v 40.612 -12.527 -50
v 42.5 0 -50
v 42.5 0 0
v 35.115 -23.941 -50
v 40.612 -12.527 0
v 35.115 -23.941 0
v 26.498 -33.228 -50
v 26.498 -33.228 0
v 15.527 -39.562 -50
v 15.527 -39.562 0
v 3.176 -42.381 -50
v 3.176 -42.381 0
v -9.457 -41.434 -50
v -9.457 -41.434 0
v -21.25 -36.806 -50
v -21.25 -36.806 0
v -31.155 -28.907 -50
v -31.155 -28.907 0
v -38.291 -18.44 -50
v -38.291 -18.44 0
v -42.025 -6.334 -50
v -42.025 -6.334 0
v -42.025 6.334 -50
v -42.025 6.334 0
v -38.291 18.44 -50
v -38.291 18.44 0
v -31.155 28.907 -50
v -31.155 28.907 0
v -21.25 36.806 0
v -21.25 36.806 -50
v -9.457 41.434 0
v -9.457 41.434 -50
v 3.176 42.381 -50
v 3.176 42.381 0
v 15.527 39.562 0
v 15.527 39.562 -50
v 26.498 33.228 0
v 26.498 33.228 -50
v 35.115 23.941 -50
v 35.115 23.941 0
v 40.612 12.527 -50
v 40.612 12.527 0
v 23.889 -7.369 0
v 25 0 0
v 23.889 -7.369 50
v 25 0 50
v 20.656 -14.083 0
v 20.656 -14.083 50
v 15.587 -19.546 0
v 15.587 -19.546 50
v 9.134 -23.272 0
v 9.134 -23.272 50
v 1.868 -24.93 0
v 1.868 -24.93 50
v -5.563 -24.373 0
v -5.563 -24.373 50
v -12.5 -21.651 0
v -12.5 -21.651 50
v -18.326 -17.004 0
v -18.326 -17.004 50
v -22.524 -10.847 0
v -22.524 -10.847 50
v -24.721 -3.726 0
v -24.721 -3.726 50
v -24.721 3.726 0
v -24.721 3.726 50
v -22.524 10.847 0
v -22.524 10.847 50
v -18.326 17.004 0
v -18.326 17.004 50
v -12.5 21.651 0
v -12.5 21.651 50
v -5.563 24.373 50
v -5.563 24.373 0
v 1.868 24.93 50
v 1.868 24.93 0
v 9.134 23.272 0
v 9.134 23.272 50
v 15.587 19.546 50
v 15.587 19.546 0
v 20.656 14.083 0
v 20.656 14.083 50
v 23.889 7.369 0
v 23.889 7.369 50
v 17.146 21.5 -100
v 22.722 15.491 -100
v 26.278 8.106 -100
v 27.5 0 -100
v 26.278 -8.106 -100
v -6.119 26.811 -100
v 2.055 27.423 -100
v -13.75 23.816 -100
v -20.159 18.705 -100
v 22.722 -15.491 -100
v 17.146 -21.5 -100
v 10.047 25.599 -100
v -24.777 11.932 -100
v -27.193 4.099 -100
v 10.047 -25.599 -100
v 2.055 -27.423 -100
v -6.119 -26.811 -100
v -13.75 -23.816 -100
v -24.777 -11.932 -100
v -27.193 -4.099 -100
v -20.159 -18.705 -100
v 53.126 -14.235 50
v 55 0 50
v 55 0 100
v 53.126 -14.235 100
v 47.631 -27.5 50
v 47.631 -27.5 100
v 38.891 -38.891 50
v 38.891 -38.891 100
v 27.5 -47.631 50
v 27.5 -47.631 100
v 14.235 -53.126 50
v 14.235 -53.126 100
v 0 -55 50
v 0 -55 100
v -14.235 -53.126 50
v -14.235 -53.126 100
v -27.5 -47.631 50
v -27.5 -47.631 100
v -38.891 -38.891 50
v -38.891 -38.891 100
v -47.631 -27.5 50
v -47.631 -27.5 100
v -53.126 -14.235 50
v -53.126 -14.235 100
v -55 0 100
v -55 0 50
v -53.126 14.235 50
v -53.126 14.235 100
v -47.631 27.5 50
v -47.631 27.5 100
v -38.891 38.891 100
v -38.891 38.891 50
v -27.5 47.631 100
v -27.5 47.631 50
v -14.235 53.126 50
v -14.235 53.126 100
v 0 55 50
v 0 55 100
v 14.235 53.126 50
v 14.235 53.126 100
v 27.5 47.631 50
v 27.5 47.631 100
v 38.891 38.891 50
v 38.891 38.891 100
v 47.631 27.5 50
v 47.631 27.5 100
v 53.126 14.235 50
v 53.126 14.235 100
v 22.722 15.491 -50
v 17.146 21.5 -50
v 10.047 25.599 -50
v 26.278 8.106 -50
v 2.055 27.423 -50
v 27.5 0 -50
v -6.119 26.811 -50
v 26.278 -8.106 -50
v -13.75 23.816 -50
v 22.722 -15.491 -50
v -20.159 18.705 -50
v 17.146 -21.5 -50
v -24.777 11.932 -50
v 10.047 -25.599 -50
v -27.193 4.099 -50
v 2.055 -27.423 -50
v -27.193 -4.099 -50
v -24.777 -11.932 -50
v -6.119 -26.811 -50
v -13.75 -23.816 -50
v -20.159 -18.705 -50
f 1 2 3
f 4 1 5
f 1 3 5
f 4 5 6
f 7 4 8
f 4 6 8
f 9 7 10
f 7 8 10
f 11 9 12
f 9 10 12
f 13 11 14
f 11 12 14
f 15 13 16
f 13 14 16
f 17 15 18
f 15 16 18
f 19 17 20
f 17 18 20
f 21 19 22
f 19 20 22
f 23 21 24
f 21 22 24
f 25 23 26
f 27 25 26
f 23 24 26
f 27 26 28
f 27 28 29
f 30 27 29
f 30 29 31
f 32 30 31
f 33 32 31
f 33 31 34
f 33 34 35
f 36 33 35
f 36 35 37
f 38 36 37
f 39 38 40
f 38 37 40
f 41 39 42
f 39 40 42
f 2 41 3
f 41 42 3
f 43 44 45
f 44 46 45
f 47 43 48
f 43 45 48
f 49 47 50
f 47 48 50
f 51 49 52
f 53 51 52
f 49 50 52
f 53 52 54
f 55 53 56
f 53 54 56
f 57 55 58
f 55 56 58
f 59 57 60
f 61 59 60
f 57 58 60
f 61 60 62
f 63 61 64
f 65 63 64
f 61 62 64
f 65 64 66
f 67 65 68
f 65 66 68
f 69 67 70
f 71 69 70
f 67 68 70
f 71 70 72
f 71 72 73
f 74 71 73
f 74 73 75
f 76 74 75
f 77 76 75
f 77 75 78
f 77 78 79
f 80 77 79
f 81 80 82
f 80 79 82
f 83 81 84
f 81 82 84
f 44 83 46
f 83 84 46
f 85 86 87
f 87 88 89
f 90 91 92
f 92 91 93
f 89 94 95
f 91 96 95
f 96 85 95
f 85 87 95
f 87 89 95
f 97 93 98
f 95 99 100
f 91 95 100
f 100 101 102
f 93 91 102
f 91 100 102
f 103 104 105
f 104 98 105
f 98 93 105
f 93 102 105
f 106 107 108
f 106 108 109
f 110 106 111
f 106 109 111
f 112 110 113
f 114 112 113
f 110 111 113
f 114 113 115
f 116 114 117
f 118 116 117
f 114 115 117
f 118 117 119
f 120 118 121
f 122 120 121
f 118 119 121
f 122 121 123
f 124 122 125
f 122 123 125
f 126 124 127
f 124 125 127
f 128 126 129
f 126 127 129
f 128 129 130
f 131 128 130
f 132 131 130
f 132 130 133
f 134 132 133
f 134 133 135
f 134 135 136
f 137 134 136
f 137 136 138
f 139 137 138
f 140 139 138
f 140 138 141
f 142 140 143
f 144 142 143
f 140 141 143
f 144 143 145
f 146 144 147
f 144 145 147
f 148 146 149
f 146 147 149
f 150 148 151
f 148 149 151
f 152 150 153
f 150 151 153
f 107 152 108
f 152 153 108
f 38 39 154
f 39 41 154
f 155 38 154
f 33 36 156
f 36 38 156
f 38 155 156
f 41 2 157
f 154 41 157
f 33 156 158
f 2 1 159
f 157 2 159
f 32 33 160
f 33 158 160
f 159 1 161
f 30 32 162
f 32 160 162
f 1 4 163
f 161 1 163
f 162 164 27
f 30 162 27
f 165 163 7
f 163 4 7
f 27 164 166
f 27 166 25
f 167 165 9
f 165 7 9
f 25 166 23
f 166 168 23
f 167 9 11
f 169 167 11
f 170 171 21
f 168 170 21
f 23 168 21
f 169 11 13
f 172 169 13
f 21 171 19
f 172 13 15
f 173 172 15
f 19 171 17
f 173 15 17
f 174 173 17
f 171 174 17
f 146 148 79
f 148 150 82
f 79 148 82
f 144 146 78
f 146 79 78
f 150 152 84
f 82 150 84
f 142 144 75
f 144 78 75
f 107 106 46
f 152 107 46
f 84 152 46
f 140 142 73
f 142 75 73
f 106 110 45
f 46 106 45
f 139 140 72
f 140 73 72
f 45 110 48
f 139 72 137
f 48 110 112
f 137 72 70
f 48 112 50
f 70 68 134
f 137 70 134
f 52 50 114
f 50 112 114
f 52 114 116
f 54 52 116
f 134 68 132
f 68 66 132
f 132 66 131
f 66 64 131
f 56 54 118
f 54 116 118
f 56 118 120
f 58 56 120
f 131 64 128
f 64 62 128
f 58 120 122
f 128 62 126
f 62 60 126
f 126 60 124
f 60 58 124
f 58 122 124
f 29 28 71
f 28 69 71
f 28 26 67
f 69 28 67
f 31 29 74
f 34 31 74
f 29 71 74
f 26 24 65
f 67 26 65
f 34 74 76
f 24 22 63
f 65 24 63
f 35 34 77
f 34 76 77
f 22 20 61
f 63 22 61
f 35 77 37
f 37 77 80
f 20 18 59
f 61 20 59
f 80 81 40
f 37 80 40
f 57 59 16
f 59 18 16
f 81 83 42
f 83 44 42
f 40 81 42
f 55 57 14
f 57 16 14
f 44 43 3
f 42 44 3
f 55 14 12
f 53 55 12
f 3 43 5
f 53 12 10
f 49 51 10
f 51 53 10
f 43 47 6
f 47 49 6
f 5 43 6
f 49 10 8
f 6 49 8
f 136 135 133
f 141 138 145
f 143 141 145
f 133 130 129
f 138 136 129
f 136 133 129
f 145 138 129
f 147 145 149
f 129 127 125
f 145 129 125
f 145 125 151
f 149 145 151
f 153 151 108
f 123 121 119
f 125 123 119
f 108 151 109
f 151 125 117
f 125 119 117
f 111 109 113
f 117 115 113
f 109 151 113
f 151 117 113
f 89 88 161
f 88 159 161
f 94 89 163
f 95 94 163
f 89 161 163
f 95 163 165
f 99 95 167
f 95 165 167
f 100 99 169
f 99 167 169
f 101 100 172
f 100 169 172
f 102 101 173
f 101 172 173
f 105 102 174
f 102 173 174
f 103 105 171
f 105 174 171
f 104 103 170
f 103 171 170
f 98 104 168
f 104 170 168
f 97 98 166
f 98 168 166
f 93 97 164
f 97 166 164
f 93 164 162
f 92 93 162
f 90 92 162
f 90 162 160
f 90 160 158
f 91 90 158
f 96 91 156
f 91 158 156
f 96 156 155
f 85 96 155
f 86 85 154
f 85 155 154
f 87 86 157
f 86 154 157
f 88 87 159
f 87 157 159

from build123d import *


with BuildPart() as part:
    # Esquisse1 → R_volution1 (revolve)
    with BuildSketch(Plane(origin=(0, 0, 0), x_dir=(1, 0, 0), z_dir=(0, 1, 0)), mode=Mode.PRIVATE) as r_volution1_sk:
        Polygon((0, 100), (-27.5, 100), (-27.5, 50), (-42.5, 50), (-42.5, 0), (-25, 0), (-25, -50), (-55, -50), (-55, -100), (0, -100), align=None)
    revolve(r_volution1_sk.sketch.rotate(Axis((0, 0, 100), (0, 0, -1)), 180), axis=Axis((0, 0, 100), (0, 0, -1)))  # turned: the seam where the file's is


solid = part.part
